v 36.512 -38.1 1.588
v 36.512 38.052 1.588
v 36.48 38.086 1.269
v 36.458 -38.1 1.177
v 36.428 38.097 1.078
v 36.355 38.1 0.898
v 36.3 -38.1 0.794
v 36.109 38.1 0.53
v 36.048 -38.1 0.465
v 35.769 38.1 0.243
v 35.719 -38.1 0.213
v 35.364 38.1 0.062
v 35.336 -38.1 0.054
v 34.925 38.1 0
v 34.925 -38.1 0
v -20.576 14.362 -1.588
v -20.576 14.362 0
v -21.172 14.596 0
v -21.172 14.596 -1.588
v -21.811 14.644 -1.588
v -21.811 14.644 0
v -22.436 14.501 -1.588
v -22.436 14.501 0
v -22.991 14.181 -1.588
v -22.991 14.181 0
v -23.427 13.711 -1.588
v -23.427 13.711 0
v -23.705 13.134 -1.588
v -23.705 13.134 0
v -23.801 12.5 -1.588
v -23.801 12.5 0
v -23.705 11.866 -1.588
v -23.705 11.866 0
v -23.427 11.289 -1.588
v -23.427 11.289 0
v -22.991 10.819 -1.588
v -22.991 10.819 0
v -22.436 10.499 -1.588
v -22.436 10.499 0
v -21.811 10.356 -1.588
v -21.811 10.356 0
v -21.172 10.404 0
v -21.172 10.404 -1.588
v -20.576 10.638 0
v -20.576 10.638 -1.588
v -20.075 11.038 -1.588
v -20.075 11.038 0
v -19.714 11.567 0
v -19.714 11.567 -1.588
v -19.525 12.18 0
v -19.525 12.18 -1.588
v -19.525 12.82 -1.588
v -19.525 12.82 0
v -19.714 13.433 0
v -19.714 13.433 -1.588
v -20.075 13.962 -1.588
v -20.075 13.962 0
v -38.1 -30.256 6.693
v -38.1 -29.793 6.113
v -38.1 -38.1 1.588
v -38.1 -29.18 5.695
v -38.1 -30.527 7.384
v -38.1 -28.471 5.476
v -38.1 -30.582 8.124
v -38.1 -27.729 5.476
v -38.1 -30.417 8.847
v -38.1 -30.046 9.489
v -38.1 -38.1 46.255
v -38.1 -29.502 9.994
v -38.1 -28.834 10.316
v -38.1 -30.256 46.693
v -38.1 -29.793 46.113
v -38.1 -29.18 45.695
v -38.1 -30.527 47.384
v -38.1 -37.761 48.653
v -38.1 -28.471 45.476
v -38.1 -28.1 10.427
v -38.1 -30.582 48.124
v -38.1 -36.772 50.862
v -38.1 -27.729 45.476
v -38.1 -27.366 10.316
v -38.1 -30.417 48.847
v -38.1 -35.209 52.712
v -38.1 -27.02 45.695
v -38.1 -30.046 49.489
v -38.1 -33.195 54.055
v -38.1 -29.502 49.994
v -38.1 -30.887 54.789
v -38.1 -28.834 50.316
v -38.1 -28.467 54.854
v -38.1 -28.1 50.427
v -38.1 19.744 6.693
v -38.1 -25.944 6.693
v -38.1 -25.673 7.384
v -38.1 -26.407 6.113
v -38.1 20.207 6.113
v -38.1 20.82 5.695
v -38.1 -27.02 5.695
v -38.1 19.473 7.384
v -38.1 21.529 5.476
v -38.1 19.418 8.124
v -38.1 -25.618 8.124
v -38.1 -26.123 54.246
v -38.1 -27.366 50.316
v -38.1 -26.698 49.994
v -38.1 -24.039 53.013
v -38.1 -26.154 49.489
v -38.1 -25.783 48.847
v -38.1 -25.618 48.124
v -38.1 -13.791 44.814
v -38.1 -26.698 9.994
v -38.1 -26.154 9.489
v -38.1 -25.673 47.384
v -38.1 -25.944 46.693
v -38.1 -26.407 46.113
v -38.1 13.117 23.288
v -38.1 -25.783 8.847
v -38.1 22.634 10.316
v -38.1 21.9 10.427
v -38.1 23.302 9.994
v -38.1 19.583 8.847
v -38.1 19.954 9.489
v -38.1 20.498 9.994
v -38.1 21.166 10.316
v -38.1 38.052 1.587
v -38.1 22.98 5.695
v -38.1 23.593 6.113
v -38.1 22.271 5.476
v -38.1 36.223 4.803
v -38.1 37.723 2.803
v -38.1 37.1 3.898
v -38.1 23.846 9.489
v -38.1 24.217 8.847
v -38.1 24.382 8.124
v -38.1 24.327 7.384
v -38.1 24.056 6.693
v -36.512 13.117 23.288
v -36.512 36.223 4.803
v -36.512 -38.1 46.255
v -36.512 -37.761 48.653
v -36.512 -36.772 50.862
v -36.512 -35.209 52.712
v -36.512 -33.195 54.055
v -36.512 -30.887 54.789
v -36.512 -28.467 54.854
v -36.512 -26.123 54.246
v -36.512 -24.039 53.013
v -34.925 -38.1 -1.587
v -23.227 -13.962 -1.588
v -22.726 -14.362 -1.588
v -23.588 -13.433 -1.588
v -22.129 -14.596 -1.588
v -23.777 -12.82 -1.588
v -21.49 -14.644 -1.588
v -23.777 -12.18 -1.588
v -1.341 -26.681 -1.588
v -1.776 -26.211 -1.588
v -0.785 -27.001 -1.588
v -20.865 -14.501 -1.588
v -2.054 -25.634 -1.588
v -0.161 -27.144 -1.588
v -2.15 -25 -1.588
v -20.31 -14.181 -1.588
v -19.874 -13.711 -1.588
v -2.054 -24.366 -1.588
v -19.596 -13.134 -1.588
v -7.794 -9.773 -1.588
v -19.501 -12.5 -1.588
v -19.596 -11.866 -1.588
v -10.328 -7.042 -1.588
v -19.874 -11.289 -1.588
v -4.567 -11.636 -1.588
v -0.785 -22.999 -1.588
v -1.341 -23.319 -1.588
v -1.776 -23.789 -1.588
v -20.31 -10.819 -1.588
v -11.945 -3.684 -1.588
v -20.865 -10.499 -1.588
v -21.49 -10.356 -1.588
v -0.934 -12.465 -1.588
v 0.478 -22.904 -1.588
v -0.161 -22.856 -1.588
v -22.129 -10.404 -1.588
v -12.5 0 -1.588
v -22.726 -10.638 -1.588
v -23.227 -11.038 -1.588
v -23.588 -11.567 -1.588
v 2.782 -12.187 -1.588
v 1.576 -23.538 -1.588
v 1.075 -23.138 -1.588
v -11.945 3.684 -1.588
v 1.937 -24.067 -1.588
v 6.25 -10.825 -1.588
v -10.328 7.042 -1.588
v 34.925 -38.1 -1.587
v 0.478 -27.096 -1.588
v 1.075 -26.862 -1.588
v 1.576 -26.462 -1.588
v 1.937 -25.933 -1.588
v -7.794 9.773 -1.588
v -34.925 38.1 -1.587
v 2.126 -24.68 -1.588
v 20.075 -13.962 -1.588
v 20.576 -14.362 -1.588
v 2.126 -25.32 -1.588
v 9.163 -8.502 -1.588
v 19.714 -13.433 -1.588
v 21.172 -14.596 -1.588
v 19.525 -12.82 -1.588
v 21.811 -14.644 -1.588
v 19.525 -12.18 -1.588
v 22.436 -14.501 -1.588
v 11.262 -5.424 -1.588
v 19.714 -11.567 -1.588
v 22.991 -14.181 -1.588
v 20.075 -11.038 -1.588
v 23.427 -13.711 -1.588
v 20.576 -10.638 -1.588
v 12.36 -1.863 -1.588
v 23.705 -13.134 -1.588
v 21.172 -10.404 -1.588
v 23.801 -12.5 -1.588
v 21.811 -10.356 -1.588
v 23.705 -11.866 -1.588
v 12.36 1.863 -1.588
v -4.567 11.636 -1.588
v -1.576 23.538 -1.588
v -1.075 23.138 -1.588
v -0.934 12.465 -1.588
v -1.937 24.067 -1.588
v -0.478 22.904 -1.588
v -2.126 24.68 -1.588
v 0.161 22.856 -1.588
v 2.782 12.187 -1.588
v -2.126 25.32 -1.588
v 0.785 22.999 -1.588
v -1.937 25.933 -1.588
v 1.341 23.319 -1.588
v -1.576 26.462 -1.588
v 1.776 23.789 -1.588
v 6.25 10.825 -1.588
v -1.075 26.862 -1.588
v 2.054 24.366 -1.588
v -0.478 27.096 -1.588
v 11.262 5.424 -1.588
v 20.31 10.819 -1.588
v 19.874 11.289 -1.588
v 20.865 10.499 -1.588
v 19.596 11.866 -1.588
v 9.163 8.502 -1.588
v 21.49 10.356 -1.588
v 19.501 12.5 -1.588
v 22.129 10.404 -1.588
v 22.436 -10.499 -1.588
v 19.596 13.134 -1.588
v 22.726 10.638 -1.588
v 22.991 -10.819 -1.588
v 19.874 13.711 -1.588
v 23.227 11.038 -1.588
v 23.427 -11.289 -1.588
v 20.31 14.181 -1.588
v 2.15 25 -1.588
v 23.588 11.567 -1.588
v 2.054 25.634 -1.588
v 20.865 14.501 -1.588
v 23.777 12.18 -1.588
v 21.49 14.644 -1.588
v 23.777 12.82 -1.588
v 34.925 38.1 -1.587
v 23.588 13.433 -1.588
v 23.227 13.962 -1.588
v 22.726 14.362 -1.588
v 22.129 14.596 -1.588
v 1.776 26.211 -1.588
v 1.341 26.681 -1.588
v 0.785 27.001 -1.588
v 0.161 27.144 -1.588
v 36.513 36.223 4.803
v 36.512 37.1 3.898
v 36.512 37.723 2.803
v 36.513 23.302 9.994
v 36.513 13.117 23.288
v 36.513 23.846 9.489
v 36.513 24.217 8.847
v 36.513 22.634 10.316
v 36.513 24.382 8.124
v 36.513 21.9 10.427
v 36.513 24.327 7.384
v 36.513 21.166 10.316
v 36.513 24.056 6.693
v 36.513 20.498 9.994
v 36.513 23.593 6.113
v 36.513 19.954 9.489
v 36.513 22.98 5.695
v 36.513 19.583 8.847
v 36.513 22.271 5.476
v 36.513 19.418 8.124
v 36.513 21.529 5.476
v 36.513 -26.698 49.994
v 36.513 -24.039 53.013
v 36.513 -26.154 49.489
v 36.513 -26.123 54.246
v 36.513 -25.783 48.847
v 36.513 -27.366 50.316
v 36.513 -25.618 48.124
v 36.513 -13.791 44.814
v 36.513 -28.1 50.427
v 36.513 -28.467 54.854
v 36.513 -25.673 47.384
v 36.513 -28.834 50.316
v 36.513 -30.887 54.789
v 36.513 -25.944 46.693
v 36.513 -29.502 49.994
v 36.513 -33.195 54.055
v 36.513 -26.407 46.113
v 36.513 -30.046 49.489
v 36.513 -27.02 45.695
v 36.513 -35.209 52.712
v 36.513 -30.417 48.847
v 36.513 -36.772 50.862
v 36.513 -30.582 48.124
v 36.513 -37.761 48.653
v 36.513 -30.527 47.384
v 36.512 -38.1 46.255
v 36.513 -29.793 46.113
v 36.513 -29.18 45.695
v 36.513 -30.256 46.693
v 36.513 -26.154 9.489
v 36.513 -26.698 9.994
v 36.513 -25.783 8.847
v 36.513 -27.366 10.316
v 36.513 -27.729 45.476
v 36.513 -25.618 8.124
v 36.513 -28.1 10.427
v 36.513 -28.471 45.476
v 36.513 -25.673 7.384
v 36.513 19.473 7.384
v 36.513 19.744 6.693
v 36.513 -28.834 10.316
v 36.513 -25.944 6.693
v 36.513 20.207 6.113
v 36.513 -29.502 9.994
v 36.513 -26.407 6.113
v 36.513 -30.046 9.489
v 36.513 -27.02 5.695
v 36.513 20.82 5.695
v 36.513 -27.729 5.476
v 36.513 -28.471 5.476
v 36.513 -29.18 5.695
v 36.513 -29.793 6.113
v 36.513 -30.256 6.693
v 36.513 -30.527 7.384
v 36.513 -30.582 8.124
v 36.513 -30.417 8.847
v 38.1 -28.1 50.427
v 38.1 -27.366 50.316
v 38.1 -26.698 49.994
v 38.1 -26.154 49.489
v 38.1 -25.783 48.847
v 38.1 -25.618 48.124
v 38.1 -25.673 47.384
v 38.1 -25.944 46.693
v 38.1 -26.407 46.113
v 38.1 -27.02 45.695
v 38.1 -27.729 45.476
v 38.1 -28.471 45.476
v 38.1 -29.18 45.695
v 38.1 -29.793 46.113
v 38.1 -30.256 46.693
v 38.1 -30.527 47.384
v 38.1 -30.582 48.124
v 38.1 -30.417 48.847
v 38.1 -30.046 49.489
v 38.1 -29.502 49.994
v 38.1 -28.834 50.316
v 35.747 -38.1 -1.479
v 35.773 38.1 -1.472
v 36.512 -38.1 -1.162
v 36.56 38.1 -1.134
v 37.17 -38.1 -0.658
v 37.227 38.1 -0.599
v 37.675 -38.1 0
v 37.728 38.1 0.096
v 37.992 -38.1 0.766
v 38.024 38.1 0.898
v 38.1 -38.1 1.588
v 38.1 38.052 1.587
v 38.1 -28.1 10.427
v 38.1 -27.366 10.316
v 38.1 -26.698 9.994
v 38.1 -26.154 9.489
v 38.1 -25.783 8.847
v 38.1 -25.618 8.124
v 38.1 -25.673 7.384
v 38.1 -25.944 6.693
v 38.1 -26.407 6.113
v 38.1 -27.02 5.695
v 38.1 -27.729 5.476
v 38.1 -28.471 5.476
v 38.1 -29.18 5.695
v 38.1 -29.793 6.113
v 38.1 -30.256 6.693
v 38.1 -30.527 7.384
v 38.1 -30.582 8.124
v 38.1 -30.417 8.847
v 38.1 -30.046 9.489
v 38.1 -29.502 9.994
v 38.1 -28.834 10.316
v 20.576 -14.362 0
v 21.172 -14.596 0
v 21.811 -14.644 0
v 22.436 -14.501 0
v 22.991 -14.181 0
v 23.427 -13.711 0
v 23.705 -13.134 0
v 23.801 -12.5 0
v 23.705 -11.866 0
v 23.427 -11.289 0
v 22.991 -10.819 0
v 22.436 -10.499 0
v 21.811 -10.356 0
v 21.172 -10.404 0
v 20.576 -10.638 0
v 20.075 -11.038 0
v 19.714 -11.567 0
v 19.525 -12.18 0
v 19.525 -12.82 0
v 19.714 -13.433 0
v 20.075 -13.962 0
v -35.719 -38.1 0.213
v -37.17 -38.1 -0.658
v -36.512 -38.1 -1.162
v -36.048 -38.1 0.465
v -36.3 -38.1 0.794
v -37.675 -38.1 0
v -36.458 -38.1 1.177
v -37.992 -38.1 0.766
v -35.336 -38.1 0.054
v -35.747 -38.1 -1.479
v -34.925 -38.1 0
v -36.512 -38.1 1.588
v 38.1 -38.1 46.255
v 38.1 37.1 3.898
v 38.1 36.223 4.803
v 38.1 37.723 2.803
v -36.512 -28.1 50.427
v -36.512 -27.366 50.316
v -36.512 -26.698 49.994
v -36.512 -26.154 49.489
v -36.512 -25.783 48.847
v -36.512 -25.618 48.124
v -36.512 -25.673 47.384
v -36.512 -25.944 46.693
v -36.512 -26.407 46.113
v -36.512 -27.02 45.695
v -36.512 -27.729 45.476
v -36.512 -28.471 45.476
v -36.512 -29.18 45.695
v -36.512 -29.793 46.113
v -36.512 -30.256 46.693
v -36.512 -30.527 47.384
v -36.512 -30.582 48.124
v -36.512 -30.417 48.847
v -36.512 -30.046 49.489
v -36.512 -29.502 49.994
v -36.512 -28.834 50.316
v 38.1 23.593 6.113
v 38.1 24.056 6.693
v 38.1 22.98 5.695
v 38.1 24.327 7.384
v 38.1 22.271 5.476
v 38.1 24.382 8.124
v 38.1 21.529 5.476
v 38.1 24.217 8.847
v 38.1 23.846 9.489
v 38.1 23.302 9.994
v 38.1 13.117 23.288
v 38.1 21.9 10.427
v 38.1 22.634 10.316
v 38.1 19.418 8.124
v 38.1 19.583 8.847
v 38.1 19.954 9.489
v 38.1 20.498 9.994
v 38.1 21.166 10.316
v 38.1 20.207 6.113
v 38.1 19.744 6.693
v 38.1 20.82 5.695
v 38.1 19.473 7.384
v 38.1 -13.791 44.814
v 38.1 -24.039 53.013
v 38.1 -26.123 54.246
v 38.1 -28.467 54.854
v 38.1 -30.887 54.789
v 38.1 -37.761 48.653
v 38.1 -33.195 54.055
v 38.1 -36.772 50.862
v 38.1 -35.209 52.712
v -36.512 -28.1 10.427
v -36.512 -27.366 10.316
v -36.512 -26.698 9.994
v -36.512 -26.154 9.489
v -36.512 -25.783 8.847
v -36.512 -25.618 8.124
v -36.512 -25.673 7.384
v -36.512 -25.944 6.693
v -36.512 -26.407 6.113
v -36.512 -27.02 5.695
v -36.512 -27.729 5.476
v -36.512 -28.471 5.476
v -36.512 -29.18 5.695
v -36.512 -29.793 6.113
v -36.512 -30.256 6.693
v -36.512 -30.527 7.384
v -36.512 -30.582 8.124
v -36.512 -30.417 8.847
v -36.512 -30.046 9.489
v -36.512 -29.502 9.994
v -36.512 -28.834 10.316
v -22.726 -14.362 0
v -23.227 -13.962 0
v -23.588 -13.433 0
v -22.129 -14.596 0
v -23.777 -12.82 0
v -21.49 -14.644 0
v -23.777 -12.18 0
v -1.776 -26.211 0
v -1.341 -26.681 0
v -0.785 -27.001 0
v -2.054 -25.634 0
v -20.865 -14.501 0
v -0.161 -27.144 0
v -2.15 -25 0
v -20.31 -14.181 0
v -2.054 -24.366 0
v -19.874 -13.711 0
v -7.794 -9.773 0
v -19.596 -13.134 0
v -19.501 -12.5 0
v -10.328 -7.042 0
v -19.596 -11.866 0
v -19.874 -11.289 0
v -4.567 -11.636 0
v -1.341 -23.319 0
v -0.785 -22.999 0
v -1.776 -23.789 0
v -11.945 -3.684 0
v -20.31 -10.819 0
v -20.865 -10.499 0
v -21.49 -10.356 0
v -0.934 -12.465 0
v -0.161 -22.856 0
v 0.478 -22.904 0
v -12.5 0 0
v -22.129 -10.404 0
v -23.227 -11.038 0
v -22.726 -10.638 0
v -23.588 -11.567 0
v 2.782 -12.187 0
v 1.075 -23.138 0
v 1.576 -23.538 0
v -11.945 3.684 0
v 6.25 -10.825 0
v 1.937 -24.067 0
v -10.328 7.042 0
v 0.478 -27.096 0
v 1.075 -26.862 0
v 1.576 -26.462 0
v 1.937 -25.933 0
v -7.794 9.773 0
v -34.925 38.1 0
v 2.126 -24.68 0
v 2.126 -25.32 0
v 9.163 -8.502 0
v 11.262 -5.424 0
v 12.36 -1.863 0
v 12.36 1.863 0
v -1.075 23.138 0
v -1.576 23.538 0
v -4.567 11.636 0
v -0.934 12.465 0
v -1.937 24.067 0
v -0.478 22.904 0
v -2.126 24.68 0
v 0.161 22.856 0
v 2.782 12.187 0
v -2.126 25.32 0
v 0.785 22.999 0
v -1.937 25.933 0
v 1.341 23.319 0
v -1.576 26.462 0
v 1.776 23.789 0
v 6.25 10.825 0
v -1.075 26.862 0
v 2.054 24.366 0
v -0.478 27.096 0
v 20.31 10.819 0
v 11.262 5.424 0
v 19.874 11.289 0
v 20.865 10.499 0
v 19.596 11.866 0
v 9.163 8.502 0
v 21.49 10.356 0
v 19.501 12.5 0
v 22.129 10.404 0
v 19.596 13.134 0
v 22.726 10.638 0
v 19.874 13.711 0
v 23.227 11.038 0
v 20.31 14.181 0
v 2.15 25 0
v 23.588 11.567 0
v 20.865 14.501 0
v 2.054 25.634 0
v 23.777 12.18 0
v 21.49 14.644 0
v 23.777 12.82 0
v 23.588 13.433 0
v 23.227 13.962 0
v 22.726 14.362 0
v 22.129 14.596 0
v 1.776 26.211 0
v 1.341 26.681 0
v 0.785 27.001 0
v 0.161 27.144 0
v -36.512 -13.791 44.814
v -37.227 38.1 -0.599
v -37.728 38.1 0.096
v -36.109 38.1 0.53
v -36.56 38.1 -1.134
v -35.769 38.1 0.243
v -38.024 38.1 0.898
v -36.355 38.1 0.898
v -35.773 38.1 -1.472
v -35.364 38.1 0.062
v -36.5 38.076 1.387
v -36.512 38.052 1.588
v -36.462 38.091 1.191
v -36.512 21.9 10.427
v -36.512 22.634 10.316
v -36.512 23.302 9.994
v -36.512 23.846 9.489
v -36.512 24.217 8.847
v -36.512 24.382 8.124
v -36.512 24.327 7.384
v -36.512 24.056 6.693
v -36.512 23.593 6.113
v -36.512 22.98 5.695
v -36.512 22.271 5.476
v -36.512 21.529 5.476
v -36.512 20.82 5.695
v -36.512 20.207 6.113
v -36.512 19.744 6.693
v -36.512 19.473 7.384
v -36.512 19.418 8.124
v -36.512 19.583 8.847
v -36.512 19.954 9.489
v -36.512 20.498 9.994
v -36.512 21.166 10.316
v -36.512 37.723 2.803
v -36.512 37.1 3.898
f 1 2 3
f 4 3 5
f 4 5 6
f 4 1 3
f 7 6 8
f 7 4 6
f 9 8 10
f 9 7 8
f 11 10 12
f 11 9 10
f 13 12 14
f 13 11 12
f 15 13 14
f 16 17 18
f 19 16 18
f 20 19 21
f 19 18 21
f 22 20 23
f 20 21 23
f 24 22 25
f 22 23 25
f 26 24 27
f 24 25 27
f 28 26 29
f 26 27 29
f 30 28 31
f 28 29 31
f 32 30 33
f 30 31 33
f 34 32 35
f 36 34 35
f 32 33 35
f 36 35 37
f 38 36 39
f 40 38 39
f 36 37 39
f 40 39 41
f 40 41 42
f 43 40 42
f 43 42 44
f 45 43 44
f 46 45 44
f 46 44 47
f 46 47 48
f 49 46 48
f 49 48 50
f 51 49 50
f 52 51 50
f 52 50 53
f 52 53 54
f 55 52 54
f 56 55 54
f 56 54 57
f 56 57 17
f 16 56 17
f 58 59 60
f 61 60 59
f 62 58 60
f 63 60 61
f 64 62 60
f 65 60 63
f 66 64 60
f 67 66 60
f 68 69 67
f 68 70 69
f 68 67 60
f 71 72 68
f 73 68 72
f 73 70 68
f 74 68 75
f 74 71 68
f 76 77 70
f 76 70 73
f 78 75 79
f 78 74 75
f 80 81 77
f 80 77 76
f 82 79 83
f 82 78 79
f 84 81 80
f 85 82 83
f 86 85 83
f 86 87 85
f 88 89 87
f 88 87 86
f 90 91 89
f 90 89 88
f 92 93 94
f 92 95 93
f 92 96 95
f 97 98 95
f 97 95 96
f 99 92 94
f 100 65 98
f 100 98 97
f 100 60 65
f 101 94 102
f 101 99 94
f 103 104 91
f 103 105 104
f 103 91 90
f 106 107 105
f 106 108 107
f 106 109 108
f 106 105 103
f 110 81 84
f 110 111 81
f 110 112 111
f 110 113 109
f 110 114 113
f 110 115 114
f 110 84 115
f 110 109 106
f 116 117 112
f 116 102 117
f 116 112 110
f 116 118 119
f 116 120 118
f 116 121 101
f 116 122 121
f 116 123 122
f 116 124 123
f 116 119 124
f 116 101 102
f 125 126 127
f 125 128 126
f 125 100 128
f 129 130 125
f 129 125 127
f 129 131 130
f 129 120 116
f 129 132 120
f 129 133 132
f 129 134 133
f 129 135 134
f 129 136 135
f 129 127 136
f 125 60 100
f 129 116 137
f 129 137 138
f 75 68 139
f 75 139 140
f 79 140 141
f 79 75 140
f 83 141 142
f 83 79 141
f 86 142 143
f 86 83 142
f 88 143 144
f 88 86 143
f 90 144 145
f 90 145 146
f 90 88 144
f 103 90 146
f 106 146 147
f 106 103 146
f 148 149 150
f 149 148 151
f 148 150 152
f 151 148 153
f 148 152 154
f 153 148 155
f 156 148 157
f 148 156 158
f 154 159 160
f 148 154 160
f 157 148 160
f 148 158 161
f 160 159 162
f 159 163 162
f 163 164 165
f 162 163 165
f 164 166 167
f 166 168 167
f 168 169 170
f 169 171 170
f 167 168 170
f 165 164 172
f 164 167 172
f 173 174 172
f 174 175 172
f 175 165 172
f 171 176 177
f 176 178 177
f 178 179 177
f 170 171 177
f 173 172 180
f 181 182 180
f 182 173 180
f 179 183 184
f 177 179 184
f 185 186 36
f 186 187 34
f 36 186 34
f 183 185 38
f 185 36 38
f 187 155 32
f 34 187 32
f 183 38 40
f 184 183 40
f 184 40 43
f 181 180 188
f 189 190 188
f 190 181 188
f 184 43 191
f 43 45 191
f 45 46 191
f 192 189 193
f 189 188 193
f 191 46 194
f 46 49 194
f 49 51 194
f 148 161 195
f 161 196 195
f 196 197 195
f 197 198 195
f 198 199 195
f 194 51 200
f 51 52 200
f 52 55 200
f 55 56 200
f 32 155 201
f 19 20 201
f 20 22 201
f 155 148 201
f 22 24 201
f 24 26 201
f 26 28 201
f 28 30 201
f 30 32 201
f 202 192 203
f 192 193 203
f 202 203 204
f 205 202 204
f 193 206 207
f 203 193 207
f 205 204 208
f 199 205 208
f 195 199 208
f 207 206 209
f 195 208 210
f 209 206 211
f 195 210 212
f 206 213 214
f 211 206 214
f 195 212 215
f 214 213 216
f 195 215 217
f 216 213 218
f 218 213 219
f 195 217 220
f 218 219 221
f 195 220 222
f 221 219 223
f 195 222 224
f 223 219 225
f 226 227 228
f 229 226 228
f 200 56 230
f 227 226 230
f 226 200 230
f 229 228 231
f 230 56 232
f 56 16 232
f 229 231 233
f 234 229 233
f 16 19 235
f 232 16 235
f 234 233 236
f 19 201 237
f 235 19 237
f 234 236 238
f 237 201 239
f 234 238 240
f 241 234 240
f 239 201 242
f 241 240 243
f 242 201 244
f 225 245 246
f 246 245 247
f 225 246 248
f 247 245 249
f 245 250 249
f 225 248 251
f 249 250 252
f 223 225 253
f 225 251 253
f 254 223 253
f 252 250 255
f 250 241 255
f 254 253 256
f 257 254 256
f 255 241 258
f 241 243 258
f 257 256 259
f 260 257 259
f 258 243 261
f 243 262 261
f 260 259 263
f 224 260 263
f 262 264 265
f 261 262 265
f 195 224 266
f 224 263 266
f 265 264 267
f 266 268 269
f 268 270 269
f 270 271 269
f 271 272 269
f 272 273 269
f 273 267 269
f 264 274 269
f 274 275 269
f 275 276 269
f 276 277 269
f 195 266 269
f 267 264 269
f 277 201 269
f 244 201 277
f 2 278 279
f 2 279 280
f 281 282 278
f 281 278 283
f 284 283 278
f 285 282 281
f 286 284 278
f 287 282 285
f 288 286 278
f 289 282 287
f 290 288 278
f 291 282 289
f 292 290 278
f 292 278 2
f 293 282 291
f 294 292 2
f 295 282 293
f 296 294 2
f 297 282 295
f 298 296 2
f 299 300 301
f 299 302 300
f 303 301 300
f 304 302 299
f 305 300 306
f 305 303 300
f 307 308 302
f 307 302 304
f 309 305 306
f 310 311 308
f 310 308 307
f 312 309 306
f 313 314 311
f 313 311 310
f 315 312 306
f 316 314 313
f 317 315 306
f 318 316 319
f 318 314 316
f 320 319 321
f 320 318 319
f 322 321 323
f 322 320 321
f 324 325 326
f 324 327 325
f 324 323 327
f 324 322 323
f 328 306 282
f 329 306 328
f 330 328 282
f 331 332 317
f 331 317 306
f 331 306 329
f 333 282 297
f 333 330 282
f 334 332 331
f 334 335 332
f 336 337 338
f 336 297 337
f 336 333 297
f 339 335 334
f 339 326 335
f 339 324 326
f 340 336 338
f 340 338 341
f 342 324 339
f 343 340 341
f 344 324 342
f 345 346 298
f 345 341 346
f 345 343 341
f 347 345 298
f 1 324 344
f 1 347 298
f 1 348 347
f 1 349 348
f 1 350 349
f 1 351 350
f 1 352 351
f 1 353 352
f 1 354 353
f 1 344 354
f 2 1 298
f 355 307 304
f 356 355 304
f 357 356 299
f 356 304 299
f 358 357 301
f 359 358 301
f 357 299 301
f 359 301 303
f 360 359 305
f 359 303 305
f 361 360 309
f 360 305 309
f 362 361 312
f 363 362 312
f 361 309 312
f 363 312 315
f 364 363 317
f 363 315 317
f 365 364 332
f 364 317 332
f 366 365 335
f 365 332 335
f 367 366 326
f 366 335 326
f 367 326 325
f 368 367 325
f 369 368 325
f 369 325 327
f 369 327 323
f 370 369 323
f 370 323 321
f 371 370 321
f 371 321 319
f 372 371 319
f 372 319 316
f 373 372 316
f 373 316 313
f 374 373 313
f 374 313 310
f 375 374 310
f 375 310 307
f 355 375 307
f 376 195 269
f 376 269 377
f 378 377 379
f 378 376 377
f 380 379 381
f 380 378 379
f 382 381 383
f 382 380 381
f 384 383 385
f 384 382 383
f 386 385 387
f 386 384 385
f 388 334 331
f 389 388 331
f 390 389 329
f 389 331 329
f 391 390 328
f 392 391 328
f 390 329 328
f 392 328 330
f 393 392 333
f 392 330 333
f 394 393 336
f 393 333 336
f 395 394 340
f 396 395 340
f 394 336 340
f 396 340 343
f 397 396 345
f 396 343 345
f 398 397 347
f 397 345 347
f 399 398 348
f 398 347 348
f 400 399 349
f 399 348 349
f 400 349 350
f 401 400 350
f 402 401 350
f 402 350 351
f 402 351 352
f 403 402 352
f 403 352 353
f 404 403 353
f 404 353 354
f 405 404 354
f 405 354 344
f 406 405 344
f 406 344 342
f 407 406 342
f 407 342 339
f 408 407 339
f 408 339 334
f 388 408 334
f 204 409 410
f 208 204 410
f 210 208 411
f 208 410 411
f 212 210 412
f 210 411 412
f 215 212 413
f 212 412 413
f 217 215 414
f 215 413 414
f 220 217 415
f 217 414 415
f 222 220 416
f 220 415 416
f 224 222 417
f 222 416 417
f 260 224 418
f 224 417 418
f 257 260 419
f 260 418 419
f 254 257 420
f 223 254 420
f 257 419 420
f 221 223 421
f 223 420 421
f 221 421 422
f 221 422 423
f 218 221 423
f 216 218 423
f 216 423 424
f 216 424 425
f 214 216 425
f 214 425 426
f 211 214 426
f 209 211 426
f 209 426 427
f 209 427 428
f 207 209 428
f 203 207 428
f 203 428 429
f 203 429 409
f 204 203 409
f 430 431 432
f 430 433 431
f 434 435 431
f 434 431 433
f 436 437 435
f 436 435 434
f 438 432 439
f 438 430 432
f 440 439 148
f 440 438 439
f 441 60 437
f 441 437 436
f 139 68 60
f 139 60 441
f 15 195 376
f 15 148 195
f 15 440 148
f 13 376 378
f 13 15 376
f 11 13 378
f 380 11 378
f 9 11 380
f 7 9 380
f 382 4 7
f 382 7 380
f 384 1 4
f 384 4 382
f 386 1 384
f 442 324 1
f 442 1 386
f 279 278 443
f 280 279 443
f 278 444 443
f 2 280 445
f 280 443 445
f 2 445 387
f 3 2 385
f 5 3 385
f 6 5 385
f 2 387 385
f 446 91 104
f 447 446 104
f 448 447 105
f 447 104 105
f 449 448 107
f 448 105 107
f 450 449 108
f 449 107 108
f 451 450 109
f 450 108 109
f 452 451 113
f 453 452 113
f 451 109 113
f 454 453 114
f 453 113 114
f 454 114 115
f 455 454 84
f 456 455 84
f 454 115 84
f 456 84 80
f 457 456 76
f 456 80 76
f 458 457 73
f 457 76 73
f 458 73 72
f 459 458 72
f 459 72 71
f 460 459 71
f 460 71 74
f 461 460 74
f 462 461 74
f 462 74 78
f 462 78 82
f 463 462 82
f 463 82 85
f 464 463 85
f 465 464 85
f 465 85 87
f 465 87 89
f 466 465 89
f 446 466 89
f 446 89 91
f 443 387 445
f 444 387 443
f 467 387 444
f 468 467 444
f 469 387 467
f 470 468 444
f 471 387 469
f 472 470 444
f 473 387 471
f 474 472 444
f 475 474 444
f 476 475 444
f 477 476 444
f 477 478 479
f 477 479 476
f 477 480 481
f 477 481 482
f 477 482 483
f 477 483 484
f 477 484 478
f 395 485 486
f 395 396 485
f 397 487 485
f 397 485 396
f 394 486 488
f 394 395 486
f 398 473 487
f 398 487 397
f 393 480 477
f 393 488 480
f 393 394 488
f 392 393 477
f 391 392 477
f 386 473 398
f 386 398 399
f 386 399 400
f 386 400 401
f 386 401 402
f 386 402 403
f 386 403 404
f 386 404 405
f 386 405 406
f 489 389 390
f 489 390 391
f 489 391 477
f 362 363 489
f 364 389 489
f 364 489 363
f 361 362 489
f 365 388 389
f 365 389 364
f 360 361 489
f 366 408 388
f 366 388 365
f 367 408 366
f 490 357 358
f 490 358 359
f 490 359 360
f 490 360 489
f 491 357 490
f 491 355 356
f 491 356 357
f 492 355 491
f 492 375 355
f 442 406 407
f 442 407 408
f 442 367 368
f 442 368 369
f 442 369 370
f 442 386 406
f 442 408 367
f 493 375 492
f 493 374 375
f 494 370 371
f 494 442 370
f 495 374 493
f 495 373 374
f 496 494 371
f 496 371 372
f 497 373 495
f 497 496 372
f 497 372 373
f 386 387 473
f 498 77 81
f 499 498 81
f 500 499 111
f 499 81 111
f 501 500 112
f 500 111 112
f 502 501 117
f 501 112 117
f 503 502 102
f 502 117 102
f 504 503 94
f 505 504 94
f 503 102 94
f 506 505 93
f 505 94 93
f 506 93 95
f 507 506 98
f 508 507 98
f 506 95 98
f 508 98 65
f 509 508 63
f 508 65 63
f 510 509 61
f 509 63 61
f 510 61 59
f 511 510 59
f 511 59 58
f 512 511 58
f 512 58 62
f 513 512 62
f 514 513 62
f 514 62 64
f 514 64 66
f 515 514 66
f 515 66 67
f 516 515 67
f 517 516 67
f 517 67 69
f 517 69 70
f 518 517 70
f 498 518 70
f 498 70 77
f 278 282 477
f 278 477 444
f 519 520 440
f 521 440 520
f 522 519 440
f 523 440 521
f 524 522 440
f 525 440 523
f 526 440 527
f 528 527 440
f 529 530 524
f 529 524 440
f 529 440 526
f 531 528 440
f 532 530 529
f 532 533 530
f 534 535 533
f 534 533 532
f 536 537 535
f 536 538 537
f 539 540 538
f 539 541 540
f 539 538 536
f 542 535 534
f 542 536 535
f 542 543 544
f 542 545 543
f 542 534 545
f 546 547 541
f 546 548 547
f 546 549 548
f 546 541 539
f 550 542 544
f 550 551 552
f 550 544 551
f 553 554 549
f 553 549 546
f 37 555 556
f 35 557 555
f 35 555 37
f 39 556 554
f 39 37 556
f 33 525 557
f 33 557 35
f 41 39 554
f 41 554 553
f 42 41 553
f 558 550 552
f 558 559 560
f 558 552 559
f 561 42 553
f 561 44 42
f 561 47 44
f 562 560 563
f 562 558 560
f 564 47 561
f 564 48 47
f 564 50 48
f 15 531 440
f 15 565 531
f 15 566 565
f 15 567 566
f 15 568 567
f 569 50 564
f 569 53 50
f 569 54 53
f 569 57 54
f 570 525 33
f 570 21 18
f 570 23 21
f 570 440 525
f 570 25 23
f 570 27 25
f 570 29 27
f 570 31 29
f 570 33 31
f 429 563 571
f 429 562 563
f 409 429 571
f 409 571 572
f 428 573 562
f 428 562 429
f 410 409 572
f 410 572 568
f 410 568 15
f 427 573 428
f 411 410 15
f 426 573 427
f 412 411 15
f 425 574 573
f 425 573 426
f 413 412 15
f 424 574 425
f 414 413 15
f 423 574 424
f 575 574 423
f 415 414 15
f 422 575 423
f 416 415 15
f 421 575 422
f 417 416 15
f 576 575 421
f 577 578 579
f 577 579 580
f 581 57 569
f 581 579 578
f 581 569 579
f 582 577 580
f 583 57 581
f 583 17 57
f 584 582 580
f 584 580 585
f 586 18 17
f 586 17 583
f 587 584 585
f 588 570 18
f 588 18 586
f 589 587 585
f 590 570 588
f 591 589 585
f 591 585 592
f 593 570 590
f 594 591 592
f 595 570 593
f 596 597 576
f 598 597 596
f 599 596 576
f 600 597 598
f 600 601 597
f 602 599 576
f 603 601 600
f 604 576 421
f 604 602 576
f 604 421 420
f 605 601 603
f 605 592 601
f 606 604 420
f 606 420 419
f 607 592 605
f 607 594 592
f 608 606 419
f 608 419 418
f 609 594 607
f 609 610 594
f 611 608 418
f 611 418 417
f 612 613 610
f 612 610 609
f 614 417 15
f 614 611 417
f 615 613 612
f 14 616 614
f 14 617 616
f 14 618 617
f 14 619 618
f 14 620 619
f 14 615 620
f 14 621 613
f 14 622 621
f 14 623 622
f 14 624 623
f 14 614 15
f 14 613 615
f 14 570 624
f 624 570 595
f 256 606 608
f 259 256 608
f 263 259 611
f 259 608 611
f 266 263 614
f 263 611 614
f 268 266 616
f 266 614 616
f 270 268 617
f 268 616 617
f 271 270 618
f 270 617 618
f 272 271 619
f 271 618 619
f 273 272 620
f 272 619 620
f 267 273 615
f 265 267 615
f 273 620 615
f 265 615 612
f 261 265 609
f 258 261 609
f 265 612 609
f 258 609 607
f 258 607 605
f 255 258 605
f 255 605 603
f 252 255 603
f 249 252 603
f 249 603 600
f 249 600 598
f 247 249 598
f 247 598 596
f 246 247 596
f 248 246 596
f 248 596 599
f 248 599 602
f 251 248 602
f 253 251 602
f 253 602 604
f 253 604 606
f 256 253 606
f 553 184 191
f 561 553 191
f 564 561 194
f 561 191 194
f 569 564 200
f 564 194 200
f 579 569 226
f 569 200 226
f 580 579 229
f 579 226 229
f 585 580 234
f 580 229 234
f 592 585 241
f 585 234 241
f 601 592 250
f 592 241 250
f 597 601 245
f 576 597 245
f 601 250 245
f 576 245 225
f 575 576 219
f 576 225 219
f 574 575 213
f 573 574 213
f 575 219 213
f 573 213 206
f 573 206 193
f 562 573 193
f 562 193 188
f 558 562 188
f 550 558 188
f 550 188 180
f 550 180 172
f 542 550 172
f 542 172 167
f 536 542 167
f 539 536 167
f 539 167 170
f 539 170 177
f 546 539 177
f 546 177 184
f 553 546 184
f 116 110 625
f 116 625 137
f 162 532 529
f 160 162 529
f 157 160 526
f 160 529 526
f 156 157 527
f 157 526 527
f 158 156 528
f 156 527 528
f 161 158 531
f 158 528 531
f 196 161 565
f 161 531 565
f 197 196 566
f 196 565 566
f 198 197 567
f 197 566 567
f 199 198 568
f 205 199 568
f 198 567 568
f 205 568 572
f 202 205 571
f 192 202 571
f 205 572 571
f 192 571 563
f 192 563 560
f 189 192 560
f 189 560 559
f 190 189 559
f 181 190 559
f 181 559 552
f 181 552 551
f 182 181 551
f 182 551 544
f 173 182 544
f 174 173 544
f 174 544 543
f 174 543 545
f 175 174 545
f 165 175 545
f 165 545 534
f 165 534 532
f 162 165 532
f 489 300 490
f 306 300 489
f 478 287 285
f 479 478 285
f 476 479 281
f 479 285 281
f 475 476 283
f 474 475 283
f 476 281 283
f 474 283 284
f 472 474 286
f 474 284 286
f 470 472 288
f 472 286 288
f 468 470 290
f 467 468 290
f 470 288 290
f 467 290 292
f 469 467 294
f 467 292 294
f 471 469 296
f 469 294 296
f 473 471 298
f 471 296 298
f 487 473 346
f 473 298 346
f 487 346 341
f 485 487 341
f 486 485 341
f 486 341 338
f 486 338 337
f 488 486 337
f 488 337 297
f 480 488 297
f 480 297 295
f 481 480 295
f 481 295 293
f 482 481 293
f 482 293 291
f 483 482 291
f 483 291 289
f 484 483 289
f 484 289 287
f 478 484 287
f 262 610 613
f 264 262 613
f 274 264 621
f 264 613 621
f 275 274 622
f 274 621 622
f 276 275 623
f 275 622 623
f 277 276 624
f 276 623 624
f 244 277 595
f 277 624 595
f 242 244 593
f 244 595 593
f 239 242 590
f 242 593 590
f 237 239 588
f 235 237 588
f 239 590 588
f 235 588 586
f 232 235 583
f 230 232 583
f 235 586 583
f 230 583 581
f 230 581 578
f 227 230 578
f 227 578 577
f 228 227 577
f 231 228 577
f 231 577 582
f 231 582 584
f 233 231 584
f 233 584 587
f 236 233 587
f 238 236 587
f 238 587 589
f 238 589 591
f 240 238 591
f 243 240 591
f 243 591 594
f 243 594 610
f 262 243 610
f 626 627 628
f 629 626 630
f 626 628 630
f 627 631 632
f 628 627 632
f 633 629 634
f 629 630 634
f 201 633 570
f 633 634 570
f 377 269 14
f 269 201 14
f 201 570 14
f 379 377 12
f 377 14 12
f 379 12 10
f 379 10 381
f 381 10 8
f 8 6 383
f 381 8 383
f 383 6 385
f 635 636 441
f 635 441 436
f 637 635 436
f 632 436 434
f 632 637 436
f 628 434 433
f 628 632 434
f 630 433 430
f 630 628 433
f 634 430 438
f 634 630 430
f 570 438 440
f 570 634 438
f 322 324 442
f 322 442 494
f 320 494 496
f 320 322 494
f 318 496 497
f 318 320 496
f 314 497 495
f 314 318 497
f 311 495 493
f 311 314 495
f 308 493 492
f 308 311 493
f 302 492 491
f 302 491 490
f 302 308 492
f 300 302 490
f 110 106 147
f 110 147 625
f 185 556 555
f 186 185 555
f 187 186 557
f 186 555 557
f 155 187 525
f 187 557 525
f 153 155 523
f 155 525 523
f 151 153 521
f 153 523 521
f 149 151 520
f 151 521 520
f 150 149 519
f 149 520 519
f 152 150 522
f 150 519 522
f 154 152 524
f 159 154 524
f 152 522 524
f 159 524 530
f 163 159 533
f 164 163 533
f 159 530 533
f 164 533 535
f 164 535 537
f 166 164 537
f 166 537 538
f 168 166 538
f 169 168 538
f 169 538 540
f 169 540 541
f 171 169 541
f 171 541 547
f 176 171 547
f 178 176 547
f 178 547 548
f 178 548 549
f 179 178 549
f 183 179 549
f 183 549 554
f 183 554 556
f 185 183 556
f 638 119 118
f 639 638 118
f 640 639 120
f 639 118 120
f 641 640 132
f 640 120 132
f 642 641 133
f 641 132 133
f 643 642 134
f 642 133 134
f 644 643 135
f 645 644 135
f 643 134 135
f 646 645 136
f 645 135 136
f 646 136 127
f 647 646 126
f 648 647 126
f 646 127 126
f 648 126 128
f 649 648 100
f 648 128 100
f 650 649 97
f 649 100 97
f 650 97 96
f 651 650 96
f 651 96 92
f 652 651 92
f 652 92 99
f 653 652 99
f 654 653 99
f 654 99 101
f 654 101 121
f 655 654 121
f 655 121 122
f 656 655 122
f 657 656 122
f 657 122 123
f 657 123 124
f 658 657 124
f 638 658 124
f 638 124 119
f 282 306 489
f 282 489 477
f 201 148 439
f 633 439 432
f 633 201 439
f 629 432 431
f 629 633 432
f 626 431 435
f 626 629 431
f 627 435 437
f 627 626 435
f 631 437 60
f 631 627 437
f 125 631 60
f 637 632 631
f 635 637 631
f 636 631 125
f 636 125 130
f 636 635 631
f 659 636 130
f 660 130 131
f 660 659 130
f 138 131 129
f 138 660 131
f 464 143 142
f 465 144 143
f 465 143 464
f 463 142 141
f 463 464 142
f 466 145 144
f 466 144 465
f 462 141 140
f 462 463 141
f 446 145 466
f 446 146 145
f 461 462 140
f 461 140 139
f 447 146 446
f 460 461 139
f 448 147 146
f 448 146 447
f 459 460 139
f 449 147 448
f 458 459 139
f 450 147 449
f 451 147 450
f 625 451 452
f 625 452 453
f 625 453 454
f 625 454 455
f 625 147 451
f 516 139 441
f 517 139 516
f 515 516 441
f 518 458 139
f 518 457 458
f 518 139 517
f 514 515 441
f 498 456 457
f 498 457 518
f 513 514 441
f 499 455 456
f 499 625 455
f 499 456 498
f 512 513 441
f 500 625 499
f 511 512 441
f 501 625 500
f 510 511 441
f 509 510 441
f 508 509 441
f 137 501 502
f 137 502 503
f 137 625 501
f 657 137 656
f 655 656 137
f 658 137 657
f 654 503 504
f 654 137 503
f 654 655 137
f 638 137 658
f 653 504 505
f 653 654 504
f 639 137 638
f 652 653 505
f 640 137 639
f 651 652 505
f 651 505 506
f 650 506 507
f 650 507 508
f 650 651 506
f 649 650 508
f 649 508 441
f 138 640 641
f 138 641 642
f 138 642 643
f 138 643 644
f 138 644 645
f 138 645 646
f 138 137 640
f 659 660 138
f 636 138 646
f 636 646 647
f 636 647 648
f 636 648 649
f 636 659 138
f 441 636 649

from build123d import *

# Parameters (mm, degrees)
SKETCH1_W                      = 76.2
SKETCH1_H                      = 76.2
BASE_FLANGE1_DEPTH             = 1.5875
EDGE_FLANGE1_STRIP_W           = 9.525
EDGE_FLANGE1_STRIP_H           = 1.5875
EDGE_FLANGE1_STRIP_CUT_DEPTH   = 76.2
EDGE_FLANGE1_STRIP_2_W         = 9.525
EDGE_FLANGE1_STRIP_2_H         = 1.5875
EDGE_FLANGE1_STRIP_CUT_2_DEPTH = 76.2
EDGE_FLANGE1_DEPTH             = 76.2
EDGE_FLANGE1_BEND_DEPTH        = 76.2
UOR23_ARM_2_P_002_START        = -73.139044615
UOR23_ARM_2_P_002_OUTLINE_R    = 2.4892
UOR23_ARM_2_P_002_OUTLINE_R_2  = 15.875
UOR23_ARM_2_P_002_OUTLINE_R_3  = 4.7625
UOR23_ARM_2_P_002_DEPTH        = 4.7625
BODY_MOVE_COPY2_ANGLE          = 90
SKETCH19_R                     = 2.4892
CUT_EXTRUDE1_DEPTH             = 116.786744303
CUT_EXTRUDE2_REACH             = 80.071
SKETCH21_R                     = 12.5
M4_CLEARANCE_HOLE1_D           = 4.3
CIRPATTERN1_COUNT              = 6
FILLET1_R                      = 5


with BuildPart() as part:
    # Base-Flange1: sheet metal written as solids
    # Sketch1 → Base-Flange1 (new body)
    with BuildSketch(Plane.XY):
        Rectangle(SKETCH1_W, SKETCH1_H)
    extrude(amount=-BASE_FLANGE1_DEPTH)

    # Edge-Flange1: sheet metal written as solids
    # Edge-Flange1 strip (on a plane across the edge) → Edge-Flange1 strip cut (cut)
    with BuildSketch(Plane(origin=(-38.1, 38.1, 0), x_dir=(1, 0, 0), z_dir=(0, -1, 0))):
        with Locations((-1.5875, -0.79375)):
            Rectangle(EDGE_FLANGE1_STRIP_W, EDGE_FLANGE1_STRIP_H)
    extrude(amount=EDGE_FLANGE1_STRIP_CUT_DEPTH, mode=Mode.SUBTRACT)

    # Edge-Flange1 strip 2 (on a plane across the edge) → Edge-Flange1 strip cut 2 (cut)
    with BuildSketch(Plane(origin=(38.1, -38.1, 0), x_dir=(-1, 0, 0), z_dir=(0, 1, 0))):
        with Locations((-1.5875, -0.79375)):
            Rectangle(EDGE_FLANGE1_STRIP_2_W, EDGE_FLANGE1_STRIP_2_H)
    extrude(amount=EDGE_FLANGE1_STRIP_CUT_2_DEPTH, mode=Mode.SUBTRACT)

    # Edge-Flange1 section (on a plane across the edge) → Edge-Flange1 (add)
    with BuildSketch(Plane(origin=(-38.1, 38.1, 0), x_dir=(1, 0, 0), z_dir=(0, -1, 0))):
        with BuildLine():
            Line((0, 1.5875), (0, 78.4125))
            Line((0, 78.4125), (1.5875, 78.4125))
            Line((1.5875, 78.4125), (1.5875, 1.5875))
            ThreePointArc((1.5875, 1.5875), (2.052467985, 0.464967985), (3.175, 0))
            Line((3.175, 0), (3.175, -1.5875))
            ThreePointArc((3.175, -1.5875), (0.92993597, -0.65756403), (0, 1.5875))
        make_face()
    extrude(amount=EDGE_FLANGE1_DEPTH)

    # Edge-Flange1 section 2 (on a plane across the edge) → Edge-Flange1 bend (add)
    with BuildSketch(Plane(origin=(38.1, -38.1, 0), x_dir=(-1, 0, 0), z_dir=(0, 1, 0))):
        with BuildLine():
            Line((0, 1.5875), (0, 78.4125))
            Line((0, 78.4125), (1.5875, 78.4125))
            Line((1.5875, 78.4125), (1.5875, 1.5875))
            ThreePointArc((1.5875, 1.5875), (2.052467985, 0.464967985), (3.175, 0))
            Line((3.175, 0), (3.175, -1.5875))
            ThreePointArc((3.175, -1.5875), (0.92993597, -0.65756403), (0, 1.5875))
        make_face()
    extrude(amount=EDGE_FLANGE1_BEND_DEPTH)

    # Sketch19 → Cut-Extrude1 (cut, through all)
    with BuildSketch(Plane.ZY.offset(38.1)):
        with Locations((47.9375, -28.1)):
            Circle(SKETCH19_R)
        with Locations((7.9375, -28.1)):
            Circle(SKETCH19_R)
        with Locations((7.9375, 21.9)):
            Circle(SKETCH19_R)
        with BuildLine():
            Line((44.814024762, -13.790579067), (23.287818675, 13.117178542))
            Line((23.287818675, 13.117178542), (3.301561509, 38.1))
            Line((3.301561509, 38.1), (78.4125, 38.1))
            Line((78.4125, 38.1), (78.4125, -38.1))
            Line((78.4125, -38.1), (62.182318934, -38.1))
            Line((62.182318934, -38.1), (46.255313034, -38.1))
            ThreePointArc((46.255313034, -38.1), (54.055416951, -33.194673329), (53.013147261, -24.039482191))
            Line((53.013147261, -24.039482191), (44.814024762, -13.790579067))
        make_face()
    extrude(amount=-CUT_EXTRUDE1_DEPTH, mode=Mode.SUBTRACT)

    # Sketch21 → Cut-Extrude2 (cut, up to next)
    with BuildSketch(Plane(origin=(0, 0, -1.5875), x_dir=(-1, 0, 0), z_dir=(0, 0, -1)), mode=Mode.PRIVATE) as cut_extrude2_sk1:
        Circle(SKETCH21_R)
    cut_extrude2_tool1 = extrude(cut_extrude2_sk1.sketch, amount=-CUT_EXTRUDE2_REACH, mode=Mode.PRIVATE) & part.part
    add(cut_extrude2_tool1.solids().sort_by_distance((0, 0, -1.5875))[0], mode=Mode.SUBTRACT)

    # M4 Clearance Hole1 (through all)
    with Locations(Plane(origin=(0, 0, -1.5875), x_dir=(-1, 0, 0), z_dir=(0, 0, -1))):
        with Locations((0, 25)):
            m4_clearance_hole1 = Hole(M4_CLEARANCE_HOLE1_D / 2)

    # CirPattern1: M4 Clearance Hole1 ×6 about axis
    cirpattern1_axis = Axis((0, 0, 0), (0, 0, 1))
    for i in range(1, CIRPATTERN1_COUNT):
        add(m4_clearance_hole1.rotate(cirpattern1_axis, i * 360 / CIRPATTERN1_COUNT), mode=Mode.SUBTRACT)

    # Fillet1
    fillet1_edges = [part.edges().sort_by_distance(p)[0] for p in [
        (-37.30625, 38.1, 3.301561509),
        (37.30625, 38.1, 3.301561509),
    ]]
    fillet(fillet1_edges, radius=FILLET1_R)


with BuildPart() as body_2:
    # UOR23-ARM-2-P-002: read off the stored shape, not the designer's step
    # UOR23-ARM-2-P-002 outline → UOR23-ARM-2-P-002 (new body)
    with BuildSketch(Plane.XY.offset(UOR23_ARM_2_P_002_START)):
        with BuildLine():
            Line((-606.620760236, 28.959751689), (-512.767628332, 6.9035095))
            ThreePointArc((-512.767628332, 6.9035095), (-508.790869183, 6.208113422), (-504.760487237, 5.97528215))
            Line((-504.760487237, 5.97528215), (-79.760487237, 5.97528215))
            Line((-79.760487237, 5.97528215), (-79.760487237, 75.97528215))
            Line((-79.760487237, 75.97528215), (-504.760487237, 75.97528215))
            ThreePointArc((-504.760487237, 75.97528215), (-507.955084638, 75.829185051), (-511.123012244, 75.392113432))
            Line((-511.123012244, 75.392113432), (-605.926632805, 57.866083751))
            ThreePointArc((-605.926632805, 57.866083751), (-618.009121698, 43.694720355), (-606.620760236, 28.959751689))
        make_face()
        with Locations((-446.110487237, 15.97528215)):
            Circle(UOR23_ARM_2_P_002_OUTLINE_R, mode=Mode.SUBTRACT)
        with Locations((-366.110487237, 15.97528215)):
            Circle(UOR23_ARM_2_P_002_OUTLINE_R, mode=Mode.SUBTRACT)
        with Locations((-504.760487237, 40.97528215)):
            Circle(UOR23_ARM_2_P_002_OUTLINE_R_2, mode=Mode.SUBTRACT)
        with BuildLine():
            Line((-430.760168562, 24.758103607), (-409.233962474, 51.665861217))
            ThreePointArc((-409.233962474, 51.665861217), (-406.110487236, 53.167081026), (-402.987011999, 51.665861217))
            Line((-402.987011999, 51.665861217), (-381.460805912, 24.758103607))
            ThreePointArc((-381.460805912, 24.758103607), (-380.979068204, 20.526568495), (-384.584281149, 18.259323417))
            Line((-384.584281149, 18.259323417), (-427.636693324, 18.259323417))
            ThreePointArc((-427.636693324, 18.259323417), (-431.241906269, 20.526568495), (-430.760168562, 24.758103607))
        make_face(mode=Mode.SUBTRACT)
        with Locations((-286.110487237, 15.97528215)):
            Circle(UOR23_ARM_2_P_002_OUTLINE_R, mode=Mode.SUBTRACT)
        with Locations((-206.110487237, 15.97528215)):
            Circle(UOR23_ARM_2_P_002_OUTLINE_R, mode=Mode.SUBTRACT)
        with Locations((-126.110487237, 15.97528215)):
            Circle(UOR23_ARM_2_P_002_OUTLINE_R, mode=Mode.SUBTRACT)
        with Locations((-86.110487237, 15.97528215)):
            Circle(UOR23_ARM_2_P_002_OUTLINE_R, mode=Mode.SUBTRACT)
        with BuildLine():
            Line((-350.760168562, 24.758103607), (-329.233962474, 51.665861217))
            ThreePointArc((-329.233962474, 51.665861217), (-326.110487236, 53.167081026), (-322.987011999, 51.665861217))
            Line((-322.987011999, 51.665861217), (-301.460805912, 24.758103607))
            ThreePointArc((-301.460805912, 24.758103607), (-300.979068204, 20.526568495), (-304.584281149, 18.259323417))
            Line((-304.584281149, 18.259323417), (-347.636693324, 18.259323417))
            ThreePointArc((-347.636693324, 18.259323417), (-351.241906269, 20.526568495), (-350.760168562, 24.758103607))
        make_face(mode=Mode.SUBTRACT)
        with BuildLine():
            Line((-270.760168562, 24.758103607), (-249.233962474, 51.665861217))
            ThreePointArc((-249.233962474, 51.665861217), (-246.110487237, 53.167081026), (-242.987011999, 51.665861217))
            Line((-242.987011999, 51.665861217), (-221.460805912, 24.758103607))
            ThreePointArc((-221.460805912, 24.758103607), (-220.979068204, 20.526568495), (-224.584281149, 18.259323417))
            Line((-224.584281149, 18.259323417), (-267.636693324, 18.259323417))
            ThreePointArc((-267.636693324, 18.259323417), (-271.241906269, 20.526568495), (-270.760168562, 24.758103607))
        make_face(mode=Mode.SUBTRACT)
        with BuildLine():
            Line((-190.760168562, 24.758103607), (-169.233962474, 51.665861217))
            ThreePointArc((-169.233962474, 51.665861217), (-166.110487237, 53.167081026), (-162.987011999, 51.665861217))
            Line((-162.987011999, 51.665861217), (-141.460805912, 24.758103607))
            ThreePointArc((-141.460805912, 24.758103607), (-140.979068204, 20.526568495), (-144.584281149, 18.259323417))
            Line((-144.584281149, 18.259323417), (-187.636693324, 18.259323417))
            ThreePointArc((-187.636693324, 18.259323417), (-191.241906269, 20.526568495), (-190.760168562, 24.758103607))
        make_face(mode=Mode.SUBTRACT)
        with Locations((-603.241262538, 43.340099916)):
            Circle(UOR23_ARM_2_P_002_OUTLINE_R_3, mode=Mode.SUBTRACT)
        with BuildLine():
            ThreePointArc((-442.987011999, 30.284703083), (-446.110487236, 28.783483273), (-449.233962474, 30.284703083))
            Line((-449.233962474, 30.284703083), (-470.760168562, 57.192460692))
            ThreePointArc((-470.760168562, 57.192460692), (-471.241906269, 61.423995804), (-467.636693324, 63.691240882))
            Line((-467.636693324, 63.691240882), (-424.584281149, 63.691240882))
            ThreePointArc((-424.584281149, 63.691240882), (-420.979068204, 61.423995804), (-421.460805912, 57.192460692))
            Line((-421.460805912, 57.192460692), (-442.987011999, 30.284703083))
        make_face(mode=Mode.SUBTRACT)
        with BuildLine():
            ThreePointArc((-362.987011999, 30.284703083), (-366.110487236, 28.783483273), (-369.233962474, 30.284703083))
            Line((-369.233962474, 30.284703083), (-390.760168562, 57.192460692))
            ThreePointArc((-390.760168562, 57.192460692), (-391.241906269, 61.423995804), (-387.636693324, 63.691240882))
            Line((-387.636693324, 63.691240882), (-344.584281149, 63.691240882))
            ThreePointArc((-344.584281149, 63.691240882), (-340.979068204, 61.423995804), (-341.460805912, 57.192460692))
            Line((-341.460805912, 57.192460692), (-362.987011999, 30.284703083))
        make_face(mode=Mode.SUBTRACT)
        with Locations((-406.110487237, 65.97528215)):
            Circle(UOR23_ARM_2_P_002_OUTLINE_R, mode=Mode.SUBTRACT)
        with BuildLine():
            ThreePointArc((-282.987011999, 30.284703083), (-286.110487236, 28.783483273), (-289.233962474, 30.284703083))
            Line((-289.233962474, 30.284703083), (-310.760168562, 57.192460692))
            ThreePointArc((-310.760168562, 57.192460692), (-311.241906269, 61.423995804), (-307.636693324, 63.691240882))
            Line((-307.636693324, 63.691240882), (-264.584281149, 63.691240882))
            ThreePointArc((-264.584281149, 63.691240882), (-260.979068204, 61.423995804), (-261.460805912, 57.192460692))
            Line((-261.460805912, 57.192460692), (-282.987011999, 30.284703083))
        make_face(mode=Mode.SUBTRACT)
        with BuildLine():
            ThreePointArc((-202.987011999, 30.284703083), (-206.110487237, 28.783483273), (-209.233962474, 30.284703083))
            Line((-209.233962474, 30.284703083), (-230.760168562, 57.192460692))
            ThreePointArc((-230.760168562, 57.192460692), (-231.241906269, 61.423995804), (-227.636693324, 63.691240882))
            Line((-227.636693324, 63.691240882), (-184.584281149, 63.691240882))
            ThreePointArc((-184.584281149, 63.691240882), (-180.979068204, 61.423995804), (-181.460805912, 57.192460692))
            Line((-181.460805912, 57.192460692), (-202.987011999, 30.284703083))
        make_face(mode=Mode.SUBTRACT)
        with BuildLine():
            ThreePointArc((-122.987011999, 30.284703083), (-126.110487237, 28.783483273), (-129.233962474, 30.284703083))
            Line((-129.233962474, 30.284703083), (-150.760168562, 57.192460692))
            ThreePointArc((-150.760168562, 57.192460692), (-151.241906269, 61.423995804), (-147.636693324, 63.691240882))
            Line((-147.636693324, 63.691240882), (-104.584281149, 63.691240882))
            ThreePointArc((-104.584281149, 63.691240882), (-100.979068204, 61.423995804), (-101.460805912, 57.192460692))
            Line((-101.460805912, 57.192460692), (-122.987011999, 30.284703083))
        make_face(mode=Mode.SUBTRACT)
        with Locations((-326.110487237, 65.97528215)):
            Circle(UOR23_ARM_2_P_002_OUTLINE_R, mode=Mode.SUBTRACT)
        with Locations((-246.110487237, 65.97528215)):
            Circle(UOR23_ARM_2_P_002_OUTLINE_R, mode=Mode.SUBTRACT)
        with Locations((-166.110487237, 65.97528215)):
            Circle(UOR23_ARM_2_P_002_OUTLINE_R, mode=Mode.SUBTRACT)
        with Locations((-86.110487237, 65.97528215)):
            Circle(UOR23_ARM_2_P_002_OUTLINE_R, mode=Mode.SUBTRACT)
    extrude(amount=UOR23_ARM_2_P_002_DEPTH)


with BuildPart() as body_2_1:
    # Body-Move/Copy2: read off the stored shape, not the designer's step
    # Body-Move/Copy2: moved
    add(body_2.part.moved(Location((78.1729872, -44.0752821, 30.2765446))).rotate(Axis((0, 0, 0), (0, 1, 0)), BODY_MOVE_COPY2_ANGLE))


solid = part.part
